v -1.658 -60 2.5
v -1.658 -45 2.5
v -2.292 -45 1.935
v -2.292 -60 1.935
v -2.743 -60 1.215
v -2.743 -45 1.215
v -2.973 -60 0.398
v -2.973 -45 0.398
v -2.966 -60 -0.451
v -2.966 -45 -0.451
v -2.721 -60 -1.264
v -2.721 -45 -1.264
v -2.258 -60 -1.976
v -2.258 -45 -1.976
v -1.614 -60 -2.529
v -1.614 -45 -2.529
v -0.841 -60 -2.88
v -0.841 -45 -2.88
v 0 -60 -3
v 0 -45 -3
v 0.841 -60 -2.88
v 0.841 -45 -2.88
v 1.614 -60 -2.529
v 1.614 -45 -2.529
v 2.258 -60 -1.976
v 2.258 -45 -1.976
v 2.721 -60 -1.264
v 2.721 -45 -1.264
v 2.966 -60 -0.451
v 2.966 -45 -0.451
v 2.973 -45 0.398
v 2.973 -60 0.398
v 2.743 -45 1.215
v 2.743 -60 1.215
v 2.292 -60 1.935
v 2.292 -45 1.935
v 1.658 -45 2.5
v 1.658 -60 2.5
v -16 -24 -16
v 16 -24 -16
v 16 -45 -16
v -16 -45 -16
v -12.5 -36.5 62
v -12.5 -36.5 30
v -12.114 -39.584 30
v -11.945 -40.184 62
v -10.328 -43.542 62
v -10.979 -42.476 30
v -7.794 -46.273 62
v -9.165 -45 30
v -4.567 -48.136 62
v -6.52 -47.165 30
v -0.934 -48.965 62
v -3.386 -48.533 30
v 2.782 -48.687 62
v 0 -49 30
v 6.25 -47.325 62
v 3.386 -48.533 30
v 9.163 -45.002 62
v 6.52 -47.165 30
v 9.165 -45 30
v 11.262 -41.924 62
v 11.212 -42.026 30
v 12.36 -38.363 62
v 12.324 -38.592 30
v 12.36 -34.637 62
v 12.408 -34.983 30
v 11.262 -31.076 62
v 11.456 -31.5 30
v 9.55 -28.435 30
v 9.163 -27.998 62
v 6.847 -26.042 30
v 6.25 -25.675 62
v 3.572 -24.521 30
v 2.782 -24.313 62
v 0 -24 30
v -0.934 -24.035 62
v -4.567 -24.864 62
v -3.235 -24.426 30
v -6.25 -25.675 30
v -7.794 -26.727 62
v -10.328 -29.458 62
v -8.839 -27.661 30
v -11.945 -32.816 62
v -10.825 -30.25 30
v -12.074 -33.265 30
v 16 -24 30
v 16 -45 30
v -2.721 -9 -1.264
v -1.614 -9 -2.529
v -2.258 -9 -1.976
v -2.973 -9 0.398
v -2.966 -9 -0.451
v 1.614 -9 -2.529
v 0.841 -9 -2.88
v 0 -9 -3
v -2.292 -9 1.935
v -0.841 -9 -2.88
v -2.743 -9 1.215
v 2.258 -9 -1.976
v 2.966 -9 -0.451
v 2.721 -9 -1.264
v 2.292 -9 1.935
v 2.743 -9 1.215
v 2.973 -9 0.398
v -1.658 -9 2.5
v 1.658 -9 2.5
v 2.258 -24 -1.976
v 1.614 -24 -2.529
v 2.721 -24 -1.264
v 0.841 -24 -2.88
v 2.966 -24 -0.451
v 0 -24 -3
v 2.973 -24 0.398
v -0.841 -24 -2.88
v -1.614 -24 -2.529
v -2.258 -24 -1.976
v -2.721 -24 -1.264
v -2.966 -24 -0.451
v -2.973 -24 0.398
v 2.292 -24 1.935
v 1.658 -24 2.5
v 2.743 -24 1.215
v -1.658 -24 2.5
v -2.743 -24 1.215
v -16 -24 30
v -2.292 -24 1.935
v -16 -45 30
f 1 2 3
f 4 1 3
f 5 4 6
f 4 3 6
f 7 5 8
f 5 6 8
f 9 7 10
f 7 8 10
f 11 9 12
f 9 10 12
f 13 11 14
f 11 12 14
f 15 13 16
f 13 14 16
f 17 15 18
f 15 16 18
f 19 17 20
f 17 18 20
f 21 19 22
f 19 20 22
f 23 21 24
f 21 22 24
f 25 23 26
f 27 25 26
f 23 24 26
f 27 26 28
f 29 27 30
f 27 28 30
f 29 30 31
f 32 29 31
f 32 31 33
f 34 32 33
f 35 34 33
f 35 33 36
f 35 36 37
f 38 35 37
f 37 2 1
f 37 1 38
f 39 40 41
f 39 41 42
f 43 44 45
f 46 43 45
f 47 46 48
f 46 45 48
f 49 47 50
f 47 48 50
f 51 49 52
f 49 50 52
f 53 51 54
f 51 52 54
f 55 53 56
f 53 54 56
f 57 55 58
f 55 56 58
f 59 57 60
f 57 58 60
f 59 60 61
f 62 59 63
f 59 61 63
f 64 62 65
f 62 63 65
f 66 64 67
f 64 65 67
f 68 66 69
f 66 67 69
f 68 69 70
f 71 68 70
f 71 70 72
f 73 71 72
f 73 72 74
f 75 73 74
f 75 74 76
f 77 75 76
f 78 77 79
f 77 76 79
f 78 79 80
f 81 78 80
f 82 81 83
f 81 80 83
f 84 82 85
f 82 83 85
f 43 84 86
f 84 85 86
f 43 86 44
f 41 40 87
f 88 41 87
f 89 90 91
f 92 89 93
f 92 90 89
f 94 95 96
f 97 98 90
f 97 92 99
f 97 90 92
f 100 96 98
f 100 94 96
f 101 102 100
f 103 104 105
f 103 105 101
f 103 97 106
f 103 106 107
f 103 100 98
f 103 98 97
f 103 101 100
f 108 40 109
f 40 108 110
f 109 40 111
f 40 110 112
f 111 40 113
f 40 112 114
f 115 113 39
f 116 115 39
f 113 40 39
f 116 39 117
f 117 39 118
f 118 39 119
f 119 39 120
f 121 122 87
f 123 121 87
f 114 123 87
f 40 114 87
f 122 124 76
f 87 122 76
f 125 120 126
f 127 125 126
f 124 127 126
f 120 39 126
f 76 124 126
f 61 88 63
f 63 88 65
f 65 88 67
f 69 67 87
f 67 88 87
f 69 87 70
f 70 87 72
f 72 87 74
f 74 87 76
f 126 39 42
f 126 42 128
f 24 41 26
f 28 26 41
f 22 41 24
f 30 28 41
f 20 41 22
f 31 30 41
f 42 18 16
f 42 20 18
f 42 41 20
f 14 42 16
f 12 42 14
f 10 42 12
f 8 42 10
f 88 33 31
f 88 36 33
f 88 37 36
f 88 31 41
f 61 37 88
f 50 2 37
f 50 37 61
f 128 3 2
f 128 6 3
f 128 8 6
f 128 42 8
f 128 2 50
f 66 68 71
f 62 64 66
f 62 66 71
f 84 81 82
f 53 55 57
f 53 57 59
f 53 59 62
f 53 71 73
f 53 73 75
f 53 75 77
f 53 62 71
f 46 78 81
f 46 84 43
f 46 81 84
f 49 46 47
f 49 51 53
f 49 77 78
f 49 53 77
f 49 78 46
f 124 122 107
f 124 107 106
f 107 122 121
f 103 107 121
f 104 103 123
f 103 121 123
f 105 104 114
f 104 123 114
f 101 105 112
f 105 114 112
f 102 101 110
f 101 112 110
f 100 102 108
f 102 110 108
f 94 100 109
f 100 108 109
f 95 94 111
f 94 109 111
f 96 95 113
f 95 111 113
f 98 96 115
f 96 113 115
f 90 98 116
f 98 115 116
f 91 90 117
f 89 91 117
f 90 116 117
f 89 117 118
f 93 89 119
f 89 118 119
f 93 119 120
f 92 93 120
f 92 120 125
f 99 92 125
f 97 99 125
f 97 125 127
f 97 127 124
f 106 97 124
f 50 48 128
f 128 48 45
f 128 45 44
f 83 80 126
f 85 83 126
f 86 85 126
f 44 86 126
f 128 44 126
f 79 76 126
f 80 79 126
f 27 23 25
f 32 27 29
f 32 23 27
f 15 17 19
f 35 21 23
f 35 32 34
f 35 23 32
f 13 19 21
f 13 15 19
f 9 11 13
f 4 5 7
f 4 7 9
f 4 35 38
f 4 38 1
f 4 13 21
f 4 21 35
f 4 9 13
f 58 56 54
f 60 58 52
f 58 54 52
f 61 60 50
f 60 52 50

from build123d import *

# Parameters (mm, degrees)
SKETCH190_W             = 46
SKETCH190_H             = 32
PAD124_DEPTH            = 21
SKETCH191_R             = 12.5
PAD125_DEPTH            = 32
PAD126_DEPTH            = 15
PAD127_DEPTH            = 15
BODY099_PITCH_ANGLE     = -90
BODY099_PLACEMENT_ANGLE = 90


with BuildPart() as part:
    # Sketch190 → Pad124 (new body)
    with BuildSketch(Plane.XY):
        with Locations((7, 0)):
            Rectangle(SKETCH190_W, SKETCH190_H)
    extrude(amount=PAD124_DEPTH)

    # Sketch191 (on Face2 of Pad124) → Pad125 (join)
    with BuildSketch(Plane.YZ.offset(30)):
        with Locations((0, 12.5)):
            Circle(SKETCH191_R)
    extrude(amount=PAD125_DEPTH)

    # Sketch192 (on Face4 of Pad125) → Pad126 (join)
    with BuildSketch(Plane(origin=(0, 0, 0), x_dir=(1, 0, 0), z_dir=(0, 0, -1))):
        with BuildLine():
            ThreePointArc((2.5, 1.658312), (-3, 0), (2.5, -1.658312))
            Line((2.5, 1.658312), (2.5, -1.658312))
        make_face()
    extrude(amount=PAD126_DEPTH)

    # Sketch193 (on Face5 of Pad126) → Pad127 (join)
    with BuildSketch(Plane.XY.offset(21)):
        with BuildLine():
            ThreePointArc((2.5, 1.658312), (-3, 0), (2.5, -1.658312))
            Line((2.5, 1.658312), (2.5, -1.658312))
        make_face()
    extrude(amount=PAD127_DEPTH)


with BuildPart() as part_1:
    # Body099 pitch: moved
    add(part.part.rotate(Axis((0, 0, 0), (0, 1, 0)), BODY099_PITCH_ANGLE))


with BuildPart() as part_2:
    # Body099 placement: moved
    add(part_1.part.moved(Location((0, -24, 0))).rotate(Axis((0, -24, 0), (0, 0, 1)), BODY099_PLACEMENT_ANGLE))


solid = part_2.part
